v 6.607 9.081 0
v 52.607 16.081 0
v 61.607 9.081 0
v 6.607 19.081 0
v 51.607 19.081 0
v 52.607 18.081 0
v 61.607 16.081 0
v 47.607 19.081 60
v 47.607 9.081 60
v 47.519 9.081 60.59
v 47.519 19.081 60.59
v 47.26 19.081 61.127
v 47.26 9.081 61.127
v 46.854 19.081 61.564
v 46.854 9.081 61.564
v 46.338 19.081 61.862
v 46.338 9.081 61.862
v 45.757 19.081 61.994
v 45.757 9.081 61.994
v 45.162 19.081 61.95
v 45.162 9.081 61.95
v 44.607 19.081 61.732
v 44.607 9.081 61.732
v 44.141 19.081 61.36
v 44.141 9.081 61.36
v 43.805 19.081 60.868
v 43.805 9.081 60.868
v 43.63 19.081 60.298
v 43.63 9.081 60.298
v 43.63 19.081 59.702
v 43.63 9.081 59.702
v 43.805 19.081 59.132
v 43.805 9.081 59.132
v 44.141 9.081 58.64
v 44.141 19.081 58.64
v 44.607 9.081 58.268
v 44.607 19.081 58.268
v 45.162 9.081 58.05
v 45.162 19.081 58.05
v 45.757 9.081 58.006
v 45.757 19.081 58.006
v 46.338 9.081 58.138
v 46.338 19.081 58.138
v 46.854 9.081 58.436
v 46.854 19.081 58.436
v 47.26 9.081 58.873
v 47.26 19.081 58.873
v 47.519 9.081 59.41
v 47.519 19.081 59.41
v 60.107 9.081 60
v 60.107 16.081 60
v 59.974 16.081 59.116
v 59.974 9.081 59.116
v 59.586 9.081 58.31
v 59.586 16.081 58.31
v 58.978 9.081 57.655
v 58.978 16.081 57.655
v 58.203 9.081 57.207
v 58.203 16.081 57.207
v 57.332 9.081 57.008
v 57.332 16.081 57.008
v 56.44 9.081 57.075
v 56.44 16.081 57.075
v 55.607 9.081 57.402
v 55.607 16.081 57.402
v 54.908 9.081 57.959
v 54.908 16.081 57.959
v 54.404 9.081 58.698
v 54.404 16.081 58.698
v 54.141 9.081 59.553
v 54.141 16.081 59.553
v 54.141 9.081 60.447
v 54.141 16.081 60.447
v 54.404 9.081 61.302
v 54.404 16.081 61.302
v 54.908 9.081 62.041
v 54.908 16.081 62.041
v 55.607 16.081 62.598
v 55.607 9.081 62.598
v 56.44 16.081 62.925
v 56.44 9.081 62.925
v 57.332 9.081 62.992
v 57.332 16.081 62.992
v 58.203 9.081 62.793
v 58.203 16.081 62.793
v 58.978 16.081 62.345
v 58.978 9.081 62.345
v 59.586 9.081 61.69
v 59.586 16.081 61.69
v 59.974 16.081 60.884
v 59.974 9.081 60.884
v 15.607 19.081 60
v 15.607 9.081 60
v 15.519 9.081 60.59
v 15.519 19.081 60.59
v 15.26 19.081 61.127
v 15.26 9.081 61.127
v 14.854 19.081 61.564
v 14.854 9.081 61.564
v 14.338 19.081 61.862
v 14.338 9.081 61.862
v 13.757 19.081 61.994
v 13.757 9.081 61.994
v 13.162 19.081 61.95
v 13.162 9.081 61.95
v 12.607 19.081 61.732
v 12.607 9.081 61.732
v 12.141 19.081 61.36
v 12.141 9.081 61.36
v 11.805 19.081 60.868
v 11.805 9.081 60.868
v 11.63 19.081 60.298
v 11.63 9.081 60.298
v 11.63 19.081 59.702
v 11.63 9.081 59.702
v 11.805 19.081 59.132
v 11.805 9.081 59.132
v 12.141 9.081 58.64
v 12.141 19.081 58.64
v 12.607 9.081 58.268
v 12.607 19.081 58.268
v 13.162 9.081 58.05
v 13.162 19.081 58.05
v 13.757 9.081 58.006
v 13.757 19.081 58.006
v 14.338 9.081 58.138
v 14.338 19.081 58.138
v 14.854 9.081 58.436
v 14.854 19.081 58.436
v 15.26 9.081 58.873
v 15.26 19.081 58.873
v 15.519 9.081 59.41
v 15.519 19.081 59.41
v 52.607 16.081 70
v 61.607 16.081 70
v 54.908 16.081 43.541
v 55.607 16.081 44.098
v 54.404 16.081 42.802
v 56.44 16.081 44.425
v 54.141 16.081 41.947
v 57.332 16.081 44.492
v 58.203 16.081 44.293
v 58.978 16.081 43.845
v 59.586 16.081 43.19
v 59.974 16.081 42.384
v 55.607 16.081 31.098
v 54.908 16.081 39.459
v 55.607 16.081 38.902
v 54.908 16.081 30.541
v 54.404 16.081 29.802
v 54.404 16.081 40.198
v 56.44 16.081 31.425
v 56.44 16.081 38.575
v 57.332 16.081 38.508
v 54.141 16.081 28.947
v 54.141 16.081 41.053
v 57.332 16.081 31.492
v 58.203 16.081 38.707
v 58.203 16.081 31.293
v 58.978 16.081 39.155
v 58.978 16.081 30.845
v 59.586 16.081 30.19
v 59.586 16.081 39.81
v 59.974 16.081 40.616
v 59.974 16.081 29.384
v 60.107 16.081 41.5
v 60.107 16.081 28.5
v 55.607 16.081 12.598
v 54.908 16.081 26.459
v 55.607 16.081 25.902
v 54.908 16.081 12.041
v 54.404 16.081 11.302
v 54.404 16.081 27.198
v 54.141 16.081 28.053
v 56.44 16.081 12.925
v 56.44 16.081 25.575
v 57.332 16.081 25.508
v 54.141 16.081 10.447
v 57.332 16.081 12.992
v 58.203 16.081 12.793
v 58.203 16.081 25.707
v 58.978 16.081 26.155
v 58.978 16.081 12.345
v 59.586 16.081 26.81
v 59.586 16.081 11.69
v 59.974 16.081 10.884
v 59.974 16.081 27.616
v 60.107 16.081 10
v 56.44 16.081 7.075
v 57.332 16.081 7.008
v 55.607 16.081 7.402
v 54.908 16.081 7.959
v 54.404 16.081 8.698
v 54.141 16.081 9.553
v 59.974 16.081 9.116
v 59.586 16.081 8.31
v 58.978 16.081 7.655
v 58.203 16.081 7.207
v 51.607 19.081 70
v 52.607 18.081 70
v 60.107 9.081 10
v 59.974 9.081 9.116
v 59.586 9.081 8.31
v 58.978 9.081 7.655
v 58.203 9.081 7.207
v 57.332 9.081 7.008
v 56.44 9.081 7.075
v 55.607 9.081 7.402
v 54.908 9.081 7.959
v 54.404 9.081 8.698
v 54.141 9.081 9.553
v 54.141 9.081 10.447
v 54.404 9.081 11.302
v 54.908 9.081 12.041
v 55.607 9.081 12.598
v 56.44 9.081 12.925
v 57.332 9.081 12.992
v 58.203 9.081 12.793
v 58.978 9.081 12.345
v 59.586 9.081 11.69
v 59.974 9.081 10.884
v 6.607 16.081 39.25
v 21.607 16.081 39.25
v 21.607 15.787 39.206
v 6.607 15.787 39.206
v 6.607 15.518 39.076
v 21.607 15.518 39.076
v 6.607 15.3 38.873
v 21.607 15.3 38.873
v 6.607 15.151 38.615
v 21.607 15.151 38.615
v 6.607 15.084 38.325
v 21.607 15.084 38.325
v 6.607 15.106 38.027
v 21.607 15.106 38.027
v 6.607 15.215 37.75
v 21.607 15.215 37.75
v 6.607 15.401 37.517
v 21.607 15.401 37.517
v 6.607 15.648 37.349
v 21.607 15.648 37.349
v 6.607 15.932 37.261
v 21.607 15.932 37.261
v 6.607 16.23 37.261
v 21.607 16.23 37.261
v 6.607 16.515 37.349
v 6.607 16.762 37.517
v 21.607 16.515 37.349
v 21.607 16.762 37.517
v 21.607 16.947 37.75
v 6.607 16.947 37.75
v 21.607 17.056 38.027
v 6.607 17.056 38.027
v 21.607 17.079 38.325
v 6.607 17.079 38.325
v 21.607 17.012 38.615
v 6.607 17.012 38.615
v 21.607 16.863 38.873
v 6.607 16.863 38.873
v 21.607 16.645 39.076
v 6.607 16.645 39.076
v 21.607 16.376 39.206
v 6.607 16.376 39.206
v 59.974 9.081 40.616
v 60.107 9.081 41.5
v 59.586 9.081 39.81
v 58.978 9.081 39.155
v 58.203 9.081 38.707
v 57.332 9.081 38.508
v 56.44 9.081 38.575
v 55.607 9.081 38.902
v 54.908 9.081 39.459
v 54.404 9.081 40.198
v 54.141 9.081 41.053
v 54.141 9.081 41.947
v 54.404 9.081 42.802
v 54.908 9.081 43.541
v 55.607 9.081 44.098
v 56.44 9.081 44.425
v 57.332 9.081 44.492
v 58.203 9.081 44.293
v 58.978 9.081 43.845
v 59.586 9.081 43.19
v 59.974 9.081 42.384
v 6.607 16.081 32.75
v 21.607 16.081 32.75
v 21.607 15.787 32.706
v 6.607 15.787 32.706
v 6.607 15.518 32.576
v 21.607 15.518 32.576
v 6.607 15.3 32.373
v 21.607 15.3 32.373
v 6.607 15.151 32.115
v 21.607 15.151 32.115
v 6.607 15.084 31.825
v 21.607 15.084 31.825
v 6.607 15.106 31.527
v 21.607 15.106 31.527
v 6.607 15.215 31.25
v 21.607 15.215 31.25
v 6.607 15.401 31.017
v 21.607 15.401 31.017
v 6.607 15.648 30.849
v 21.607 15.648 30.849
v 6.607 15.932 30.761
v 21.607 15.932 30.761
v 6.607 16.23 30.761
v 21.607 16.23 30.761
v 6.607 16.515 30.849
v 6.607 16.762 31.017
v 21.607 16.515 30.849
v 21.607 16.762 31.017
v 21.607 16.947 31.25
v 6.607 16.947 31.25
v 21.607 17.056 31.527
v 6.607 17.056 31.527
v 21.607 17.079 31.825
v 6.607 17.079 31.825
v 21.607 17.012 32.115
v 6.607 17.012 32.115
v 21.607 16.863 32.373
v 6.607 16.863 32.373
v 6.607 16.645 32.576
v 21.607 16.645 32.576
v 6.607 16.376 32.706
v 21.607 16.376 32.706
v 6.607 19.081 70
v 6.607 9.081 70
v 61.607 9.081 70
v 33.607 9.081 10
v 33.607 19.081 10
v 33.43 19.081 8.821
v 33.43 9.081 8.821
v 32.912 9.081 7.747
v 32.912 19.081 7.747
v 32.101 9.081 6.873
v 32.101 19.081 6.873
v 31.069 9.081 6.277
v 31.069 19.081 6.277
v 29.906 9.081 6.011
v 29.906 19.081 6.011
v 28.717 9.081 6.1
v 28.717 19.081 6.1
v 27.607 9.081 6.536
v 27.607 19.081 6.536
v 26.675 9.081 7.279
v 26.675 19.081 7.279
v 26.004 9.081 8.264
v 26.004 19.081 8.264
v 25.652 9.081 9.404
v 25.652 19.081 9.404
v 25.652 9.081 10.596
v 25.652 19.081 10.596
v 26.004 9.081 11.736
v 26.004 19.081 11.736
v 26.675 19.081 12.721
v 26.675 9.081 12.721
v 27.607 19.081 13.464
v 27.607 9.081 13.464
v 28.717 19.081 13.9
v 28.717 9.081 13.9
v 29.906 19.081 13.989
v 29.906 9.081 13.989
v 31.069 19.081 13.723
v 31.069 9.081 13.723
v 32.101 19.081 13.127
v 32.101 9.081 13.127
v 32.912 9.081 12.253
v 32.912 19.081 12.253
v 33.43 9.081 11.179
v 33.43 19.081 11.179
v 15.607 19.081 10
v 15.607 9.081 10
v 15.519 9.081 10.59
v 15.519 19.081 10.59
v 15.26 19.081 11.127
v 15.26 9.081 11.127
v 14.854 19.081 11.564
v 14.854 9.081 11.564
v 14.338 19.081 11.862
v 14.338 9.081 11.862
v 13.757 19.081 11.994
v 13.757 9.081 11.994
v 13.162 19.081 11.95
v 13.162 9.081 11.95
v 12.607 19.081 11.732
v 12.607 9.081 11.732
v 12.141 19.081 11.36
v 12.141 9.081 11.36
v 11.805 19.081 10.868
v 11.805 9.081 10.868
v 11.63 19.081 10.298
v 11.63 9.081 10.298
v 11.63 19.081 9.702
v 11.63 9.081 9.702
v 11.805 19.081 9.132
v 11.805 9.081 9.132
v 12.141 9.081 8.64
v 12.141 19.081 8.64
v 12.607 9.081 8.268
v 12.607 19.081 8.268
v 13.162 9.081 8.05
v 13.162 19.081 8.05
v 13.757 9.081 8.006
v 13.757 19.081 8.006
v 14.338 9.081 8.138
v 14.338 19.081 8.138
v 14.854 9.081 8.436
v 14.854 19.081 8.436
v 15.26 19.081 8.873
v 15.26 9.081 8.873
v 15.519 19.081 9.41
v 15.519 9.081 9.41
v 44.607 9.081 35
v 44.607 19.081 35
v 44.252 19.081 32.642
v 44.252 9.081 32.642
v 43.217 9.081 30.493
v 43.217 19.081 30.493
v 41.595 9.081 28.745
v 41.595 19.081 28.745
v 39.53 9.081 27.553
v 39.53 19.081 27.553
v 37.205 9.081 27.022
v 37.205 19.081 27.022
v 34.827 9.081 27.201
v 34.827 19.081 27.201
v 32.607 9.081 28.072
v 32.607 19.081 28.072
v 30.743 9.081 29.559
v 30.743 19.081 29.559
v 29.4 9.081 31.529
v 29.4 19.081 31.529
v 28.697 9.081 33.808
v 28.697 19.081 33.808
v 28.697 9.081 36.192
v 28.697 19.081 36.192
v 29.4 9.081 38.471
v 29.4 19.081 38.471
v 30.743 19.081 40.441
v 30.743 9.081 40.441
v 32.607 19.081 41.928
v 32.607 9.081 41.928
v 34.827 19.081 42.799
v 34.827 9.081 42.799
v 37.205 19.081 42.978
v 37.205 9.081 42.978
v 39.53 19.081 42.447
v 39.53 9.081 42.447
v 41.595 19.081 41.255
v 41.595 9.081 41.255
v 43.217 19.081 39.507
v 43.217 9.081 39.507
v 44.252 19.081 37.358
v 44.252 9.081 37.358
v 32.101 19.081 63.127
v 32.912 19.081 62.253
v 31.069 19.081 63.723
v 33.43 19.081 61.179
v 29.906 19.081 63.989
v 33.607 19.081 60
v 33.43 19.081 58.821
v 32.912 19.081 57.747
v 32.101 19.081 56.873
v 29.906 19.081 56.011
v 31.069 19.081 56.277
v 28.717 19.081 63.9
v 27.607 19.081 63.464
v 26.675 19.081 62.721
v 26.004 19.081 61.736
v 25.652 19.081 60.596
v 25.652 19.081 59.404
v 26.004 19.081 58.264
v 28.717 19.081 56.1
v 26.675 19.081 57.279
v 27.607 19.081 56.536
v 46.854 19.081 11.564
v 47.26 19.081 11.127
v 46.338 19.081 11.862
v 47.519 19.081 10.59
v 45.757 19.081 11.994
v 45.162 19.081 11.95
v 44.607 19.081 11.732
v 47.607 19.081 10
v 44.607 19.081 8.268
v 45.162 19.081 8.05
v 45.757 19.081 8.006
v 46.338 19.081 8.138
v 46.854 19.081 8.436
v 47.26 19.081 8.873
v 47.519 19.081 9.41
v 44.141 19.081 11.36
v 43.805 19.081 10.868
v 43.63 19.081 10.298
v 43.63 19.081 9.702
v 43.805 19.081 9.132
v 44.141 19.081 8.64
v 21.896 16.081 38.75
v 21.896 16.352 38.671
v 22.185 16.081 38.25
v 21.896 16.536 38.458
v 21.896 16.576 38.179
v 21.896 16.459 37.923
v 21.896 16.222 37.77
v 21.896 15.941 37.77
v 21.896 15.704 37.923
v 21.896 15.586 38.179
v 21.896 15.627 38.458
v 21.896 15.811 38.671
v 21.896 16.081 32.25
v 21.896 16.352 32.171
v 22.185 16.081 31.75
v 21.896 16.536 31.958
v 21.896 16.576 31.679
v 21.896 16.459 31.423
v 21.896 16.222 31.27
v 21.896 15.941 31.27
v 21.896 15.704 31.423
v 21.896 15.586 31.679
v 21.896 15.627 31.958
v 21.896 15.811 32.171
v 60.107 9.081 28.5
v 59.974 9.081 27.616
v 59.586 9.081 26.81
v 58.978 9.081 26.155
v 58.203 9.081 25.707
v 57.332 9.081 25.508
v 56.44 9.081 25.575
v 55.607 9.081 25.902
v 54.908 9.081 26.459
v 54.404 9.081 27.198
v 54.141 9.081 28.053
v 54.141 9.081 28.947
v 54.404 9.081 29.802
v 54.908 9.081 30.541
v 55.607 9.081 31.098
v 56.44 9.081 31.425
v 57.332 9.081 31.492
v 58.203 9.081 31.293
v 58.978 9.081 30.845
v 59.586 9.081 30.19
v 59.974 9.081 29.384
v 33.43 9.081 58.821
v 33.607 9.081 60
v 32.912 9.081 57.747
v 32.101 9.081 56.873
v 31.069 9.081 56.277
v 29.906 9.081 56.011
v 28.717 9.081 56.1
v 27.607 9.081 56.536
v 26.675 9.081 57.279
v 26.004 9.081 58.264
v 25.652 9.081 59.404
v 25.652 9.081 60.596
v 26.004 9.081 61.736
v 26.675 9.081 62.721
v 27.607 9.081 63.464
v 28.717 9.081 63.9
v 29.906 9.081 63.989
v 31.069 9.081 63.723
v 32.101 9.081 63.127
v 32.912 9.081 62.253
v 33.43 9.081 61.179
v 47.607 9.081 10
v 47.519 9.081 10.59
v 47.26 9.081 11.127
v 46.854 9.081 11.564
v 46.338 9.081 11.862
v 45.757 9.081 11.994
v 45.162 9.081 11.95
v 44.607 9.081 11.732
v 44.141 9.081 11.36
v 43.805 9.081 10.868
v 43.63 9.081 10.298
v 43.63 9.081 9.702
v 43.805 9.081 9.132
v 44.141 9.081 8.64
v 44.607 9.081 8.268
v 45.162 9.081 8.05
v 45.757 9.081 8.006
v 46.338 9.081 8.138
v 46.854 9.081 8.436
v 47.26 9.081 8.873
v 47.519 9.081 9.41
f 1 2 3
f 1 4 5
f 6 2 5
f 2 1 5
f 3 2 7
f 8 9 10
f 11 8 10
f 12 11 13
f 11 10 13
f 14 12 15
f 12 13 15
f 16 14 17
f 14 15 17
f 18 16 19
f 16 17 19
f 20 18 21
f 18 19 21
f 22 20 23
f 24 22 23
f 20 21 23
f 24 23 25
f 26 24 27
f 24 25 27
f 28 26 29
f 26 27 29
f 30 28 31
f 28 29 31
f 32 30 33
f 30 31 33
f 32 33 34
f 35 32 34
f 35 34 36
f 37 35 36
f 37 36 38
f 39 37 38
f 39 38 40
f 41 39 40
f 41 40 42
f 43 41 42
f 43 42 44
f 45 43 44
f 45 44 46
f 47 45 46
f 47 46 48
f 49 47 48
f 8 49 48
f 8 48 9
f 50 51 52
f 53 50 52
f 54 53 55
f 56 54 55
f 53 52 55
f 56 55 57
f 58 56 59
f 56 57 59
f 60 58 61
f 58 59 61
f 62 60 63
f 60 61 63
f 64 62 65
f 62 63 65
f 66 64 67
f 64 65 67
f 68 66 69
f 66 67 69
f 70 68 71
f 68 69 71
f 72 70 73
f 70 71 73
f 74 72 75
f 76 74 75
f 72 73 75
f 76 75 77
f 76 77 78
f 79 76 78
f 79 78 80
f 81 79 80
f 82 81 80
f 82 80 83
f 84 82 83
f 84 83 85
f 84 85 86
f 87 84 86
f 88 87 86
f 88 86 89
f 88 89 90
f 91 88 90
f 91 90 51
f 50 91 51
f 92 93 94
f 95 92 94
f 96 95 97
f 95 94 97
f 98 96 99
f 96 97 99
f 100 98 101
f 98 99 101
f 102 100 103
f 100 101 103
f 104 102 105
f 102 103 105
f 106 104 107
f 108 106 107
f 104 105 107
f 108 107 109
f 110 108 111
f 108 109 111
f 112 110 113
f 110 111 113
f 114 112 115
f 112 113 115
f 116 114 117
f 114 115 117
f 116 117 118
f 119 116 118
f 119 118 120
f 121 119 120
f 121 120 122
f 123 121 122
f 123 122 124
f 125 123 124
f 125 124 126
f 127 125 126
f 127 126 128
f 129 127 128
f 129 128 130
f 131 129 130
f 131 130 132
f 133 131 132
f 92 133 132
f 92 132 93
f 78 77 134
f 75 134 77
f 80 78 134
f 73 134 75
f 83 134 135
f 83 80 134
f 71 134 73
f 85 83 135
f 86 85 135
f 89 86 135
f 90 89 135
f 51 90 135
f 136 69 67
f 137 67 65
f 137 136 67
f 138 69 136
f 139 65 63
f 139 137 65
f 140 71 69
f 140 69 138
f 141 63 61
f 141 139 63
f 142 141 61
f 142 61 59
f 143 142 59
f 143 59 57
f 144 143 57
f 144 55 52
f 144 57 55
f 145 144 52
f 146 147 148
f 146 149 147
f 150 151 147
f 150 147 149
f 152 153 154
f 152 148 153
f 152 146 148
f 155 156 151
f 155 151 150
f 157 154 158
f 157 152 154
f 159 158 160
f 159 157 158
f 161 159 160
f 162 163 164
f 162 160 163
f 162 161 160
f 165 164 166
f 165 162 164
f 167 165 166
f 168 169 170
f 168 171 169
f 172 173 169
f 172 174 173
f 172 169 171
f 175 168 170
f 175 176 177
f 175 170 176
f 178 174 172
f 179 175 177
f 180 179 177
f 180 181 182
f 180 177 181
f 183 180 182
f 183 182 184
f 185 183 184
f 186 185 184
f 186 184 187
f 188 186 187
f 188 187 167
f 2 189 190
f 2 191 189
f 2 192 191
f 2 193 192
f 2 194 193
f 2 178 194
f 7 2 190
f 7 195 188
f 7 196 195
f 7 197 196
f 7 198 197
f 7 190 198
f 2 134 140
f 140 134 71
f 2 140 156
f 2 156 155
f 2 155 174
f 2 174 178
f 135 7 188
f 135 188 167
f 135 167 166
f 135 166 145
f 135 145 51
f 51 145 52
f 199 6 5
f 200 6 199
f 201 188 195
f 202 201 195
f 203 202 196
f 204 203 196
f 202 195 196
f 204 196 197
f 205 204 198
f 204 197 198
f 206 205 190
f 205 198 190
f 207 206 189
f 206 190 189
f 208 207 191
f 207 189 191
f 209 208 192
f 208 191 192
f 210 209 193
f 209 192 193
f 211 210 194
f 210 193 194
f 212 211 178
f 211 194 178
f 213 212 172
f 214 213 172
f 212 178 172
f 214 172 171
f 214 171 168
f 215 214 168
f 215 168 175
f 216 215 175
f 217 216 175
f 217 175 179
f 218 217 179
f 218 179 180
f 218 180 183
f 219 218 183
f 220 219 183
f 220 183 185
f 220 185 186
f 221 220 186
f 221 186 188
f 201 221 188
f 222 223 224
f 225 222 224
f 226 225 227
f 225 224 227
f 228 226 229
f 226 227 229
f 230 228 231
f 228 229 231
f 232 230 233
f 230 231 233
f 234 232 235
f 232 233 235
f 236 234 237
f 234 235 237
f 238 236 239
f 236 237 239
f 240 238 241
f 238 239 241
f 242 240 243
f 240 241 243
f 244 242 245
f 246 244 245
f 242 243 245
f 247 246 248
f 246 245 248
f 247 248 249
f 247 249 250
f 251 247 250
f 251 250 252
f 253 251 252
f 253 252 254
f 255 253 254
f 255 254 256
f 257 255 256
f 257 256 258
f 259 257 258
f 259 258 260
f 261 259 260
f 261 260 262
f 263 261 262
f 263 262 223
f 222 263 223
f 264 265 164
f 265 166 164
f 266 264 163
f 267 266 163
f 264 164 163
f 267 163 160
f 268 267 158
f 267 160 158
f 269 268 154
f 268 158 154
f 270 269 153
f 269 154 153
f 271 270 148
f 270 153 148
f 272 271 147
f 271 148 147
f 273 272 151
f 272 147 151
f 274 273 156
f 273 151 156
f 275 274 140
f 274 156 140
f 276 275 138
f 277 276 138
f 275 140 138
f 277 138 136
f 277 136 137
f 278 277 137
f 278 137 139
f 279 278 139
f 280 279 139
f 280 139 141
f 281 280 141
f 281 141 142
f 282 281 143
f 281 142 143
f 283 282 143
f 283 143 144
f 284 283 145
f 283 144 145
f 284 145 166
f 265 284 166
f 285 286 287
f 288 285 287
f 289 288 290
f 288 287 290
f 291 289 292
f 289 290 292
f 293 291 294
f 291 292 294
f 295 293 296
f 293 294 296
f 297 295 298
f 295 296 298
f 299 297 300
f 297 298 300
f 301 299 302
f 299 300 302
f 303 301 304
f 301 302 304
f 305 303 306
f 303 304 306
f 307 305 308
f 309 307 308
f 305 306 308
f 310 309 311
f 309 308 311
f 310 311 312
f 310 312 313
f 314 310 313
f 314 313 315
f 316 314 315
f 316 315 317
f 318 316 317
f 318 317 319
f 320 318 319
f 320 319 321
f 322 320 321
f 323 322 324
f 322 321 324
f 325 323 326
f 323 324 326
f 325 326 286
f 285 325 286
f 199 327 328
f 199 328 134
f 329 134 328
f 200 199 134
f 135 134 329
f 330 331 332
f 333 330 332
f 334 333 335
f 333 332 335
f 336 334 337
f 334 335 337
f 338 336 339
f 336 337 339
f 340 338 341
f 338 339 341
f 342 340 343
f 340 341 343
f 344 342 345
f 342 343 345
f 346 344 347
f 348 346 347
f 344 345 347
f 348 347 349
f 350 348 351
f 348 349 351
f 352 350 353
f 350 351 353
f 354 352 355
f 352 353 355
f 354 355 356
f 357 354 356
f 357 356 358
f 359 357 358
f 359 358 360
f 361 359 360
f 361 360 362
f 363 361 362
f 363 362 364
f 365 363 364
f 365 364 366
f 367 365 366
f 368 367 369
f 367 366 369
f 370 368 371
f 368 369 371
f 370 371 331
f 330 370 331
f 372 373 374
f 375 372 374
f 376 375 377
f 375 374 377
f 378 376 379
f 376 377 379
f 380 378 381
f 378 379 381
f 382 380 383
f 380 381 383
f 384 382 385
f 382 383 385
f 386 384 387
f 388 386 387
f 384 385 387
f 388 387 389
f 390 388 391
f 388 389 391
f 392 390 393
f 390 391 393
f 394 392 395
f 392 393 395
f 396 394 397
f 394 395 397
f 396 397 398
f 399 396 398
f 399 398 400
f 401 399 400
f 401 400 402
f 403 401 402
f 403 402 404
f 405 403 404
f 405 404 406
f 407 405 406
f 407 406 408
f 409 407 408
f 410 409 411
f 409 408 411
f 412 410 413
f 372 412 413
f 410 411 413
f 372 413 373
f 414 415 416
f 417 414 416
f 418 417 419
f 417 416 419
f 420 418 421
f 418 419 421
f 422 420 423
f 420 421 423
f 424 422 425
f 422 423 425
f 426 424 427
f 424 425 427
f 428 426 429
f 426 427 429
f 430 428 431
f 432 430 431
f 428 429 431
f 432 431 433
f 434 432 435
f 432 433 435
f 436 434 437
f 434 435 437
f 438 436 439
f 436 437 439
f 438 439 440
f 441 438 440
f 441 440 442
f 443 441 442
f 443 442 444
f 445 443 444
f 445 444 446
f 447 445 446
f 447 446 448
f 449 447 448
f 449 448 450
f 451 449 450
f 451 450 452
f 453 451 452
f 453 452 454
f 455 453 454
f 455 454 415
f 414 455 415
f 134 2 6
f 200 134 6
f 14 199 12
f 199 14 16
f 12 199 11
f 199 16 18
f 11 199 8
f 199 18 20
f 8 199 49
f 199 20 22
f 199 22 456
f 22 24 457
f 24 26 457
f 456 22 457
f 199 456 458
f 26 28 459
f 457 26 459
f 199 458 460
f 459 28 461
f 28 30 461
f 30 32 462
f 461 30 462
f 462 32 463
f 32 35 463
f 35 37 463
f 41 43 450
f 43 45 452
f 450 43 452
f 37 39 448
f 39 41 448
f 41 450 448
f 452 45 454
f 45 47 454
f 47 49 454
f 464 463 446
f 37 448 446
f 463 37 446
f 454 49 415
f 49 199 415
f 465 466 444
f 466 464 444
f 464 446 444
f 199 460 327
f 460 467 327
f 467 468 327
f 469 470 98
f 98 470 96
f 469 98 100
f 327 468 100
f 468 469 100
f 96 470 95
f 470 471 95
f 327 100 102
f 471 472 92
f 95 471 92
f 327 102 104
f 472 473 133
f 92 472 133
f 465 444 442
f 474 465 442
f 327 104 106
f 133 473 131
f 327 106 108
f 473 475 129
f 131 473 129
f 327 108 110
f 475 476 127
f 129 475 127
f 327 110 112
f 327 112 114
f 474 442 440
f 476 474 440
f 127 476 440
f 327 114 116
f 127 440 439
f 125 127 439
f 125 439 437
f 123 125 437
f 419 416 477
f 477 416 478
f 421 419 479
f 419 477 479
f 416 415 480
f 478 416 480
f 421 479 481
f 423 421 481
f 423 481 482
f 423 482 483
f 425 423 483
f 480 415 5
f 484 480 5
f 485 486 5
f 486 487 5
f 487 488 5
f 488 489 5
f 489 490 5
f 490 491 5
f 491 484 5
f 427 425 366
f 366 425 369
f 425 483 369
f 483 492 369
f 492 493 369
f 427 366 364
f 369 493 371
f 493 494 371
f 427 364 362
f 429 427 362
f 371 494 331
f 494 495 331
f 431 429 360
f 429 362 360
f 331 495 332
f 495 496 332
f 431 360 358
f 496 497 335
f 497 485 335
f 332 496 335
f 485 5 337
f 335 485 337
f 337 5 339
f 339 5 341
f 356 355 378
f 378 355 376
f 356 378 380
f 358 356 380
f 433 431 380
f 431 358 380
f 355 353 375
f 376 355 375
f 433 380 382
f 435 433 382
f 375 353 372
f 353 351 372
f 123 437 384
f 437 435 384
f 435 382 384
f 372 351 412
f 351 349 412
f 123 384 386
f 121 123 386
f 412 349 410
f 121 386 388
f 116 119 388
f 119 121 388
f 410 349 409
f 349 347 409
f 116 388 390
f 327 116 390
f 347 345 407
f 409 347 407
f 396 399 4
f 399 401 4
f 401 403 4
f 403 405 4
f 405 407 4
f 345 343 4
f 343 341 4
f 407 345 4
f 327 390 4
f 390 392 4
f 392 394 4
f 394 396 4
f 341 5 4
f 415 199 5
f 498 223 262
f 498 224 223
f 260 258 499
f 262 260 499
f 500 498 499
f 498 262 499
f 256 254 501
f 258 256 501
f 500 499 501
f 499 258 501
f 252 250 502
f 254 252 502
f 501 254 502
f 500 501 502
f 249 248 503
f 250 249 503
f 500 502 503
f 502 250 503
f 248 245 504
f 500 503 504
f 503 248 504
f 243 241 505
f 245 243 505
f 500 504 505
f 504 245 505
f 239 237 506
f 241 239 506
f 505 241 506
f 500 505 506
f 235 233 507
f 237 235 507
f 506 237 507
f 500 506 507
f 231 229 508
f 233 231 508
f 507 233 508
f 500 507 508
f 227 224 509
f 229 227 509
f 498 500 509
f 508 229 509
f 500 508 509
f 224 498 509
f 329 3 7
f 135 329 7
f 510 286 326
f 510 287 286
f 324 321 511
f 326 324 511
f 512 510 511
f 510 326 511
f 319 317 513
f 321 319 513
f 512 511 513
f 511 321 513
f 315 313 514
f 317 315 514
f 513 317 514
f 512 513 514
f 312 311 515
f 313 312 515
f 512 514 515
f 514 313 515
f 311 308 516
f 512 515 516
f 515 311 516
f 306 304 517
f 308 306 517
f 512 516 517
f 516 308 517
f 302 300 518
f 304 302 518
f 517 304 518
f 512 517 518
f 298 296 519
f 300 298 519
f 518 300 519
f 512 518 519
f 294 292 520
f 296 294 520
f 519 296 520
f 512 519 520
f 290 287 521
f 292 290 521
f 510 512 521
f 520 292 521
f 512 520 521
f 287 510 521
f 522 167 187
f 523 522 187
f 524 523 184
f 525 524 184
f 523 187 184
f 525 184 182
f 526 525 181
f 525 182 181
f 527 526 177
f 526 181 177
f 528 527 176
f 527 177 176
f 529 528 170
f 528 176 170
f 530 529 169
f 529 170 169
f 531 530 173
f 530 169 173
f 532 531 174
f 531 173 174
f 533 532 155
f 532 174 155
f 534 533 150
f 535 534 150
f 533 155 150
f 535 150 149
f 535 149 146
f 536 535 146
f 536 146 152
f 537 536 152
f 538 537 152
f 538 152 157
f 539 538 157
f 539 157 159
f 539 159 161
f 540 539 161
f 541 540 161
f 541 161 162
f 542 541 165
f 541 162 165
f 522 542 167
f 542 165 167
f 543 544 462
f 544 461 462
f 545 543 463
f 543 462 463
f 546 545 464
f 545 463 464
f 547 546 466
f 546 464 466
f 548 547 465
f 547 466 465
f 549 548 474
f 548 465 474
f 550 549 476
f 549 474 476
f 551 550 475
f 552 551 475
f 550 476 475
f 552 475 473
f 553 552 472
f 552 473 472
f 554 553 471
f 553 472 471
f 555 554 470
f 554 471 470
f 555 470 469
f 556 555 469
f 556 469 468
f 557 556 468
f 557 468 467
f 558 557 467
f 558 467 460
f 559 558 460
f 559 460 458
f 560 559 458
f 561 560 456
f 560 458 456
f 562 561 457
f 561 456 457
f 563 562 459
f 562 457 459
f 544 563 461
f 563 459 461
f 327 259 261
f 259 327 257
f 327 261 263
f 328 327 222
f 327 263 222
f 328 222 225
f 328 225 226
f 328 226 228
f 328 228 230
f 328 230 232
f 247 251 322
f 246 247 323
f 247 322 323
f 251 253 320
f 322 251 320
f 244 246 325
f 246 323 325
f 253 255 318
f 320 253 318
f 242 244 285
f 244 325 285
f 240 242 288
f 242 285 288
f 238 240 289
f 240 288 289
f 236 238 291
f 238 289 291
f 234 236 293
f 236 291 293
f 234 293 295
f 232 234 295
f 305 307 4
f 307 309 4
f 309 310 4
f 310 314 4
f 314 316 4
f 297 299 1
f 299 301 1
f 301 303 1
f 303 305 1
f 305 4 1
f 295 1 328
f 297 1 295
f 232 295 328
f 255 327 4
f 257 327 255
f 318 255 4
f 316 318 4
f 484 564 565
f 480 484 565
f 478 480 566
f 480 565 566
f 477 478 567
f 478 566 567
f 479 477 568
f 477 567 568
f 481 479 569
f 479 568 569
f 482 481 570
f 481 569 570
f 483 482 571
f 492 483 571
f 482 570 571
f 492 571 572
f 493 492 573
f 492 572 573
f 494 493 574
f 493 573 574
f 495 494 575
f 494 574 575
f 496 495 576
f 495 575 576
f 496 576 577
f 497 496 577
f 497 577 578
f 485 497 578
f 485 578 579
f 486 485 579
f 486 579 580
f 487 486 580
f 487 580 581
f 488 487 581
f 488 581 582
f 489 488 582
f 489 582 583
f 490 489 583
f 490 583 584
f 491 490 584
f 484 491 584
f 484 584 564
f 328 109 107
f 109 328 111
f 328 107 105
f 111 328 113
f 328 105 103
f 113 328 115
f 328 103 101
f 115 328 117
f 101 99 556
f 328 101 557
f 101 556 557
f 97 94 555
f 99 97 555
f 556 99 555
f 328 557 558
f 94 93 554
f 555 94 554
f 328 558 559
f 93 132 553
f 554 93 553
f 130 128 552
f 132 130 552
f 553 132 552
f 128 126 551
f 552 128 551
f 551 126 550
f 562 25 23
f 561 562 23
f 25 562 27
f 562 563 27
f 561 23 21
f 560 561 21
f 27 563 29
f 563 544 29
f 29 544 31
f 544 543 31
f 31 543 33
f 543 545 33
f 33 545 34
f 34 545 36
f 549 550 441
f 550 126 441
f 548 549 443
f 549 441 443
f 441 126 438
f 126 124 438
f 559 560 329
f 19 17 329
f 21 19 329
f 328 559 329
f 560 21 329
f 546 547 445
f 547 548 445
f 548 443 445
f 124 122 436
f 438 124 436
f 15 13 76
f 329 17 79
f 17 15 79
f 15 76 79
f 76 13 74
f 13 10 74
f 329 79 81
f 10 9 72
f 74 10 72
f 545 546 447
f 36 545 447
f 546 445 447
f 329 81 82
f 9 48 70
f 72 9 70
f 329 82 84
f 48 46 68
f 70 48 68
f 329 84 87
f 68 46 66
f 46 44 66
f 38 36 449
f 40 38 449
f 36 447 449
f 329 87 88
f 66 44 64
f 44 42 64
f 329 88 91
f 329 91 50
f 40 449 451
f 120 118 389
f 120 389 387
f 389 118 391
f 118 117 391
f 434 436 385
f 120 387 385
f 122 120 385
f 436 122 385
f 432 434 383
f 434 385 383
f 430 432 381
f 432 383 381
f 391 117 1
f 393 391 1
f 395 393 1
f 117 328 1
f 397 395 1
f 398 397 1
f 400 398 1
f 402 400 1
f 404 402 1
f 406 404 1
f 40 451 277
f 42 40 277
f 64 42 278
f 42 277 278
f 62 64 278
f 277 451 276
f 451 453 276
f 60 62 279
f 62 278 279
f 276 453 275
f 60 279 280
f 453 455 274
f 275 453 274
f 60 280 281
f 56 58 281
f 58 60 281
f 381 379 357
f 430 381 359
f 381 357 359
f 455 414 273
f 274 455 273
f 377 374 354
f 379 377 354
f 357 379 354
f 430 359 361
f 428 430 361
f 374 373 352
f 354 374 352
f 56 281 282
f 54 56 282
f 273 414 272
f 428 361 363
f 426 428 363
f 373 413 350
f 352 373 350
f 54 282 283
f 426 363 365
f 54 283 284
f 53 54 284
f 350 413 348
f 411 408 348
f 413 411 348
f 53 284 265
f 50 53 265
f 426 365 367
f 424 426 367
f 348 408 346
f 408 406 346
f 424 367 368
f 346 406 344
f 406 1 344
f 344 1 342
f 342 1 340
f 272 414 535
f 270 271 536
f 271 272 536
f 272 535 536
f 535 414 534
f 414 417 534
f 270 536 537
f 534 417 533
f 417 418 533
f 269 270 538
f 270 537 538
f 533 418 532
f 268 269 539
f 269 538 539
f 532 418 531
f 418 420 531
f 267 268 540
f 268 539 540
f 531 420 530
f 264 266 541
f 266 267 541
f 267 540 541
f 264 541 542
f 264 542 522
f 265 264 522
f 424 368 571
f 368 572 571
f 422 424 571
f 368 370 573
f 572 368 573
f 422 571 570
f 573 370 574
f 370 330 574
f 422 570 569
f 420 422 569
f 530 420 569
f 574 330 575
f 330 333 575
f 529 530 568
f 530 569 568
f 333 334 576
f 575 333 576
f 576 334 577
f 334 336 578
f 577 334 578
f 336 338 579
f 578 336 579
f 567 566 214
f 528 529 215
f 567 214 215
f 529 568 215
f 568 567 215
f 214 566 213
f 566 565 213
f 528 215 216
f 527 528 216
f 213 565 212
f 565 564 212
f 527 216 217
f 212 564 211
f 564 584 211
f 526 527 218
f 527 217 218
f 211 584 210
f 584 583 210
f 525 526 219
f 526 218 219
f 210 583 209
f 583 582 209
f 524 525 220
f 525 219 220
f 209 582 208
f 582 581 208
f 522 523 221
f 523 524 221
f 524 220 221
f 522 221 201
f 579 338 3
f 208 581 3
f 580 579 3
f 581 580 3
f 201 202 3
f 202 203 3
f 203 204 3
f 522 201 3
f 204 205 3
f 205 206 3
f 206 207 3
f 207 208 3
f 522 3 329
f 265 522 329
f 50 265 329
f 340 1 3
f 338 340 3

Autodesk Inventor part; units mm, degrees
ref_plane "YZ Plane" through (0, 0, 0) normal (1, 0, 0) x (0, 1, 0)
ref_plane "XZ Plane" through (0, 0, 0) normal (0, 1, 0) x (-1, 0, 0)
ref_plane "XY Plane" through (0, 0, 0) normal (0, 0, 1) x (1, 0, 0)
sketch "Sketch1" plane through (0, 0, 0) normal (0, 0, 1) x (1, 0, 0)
  line L0 (6.6074, 9.0814) -> (61.6074, 9.0814)
  line L1 (61.6074, 9.0814) -> (61.6074, 16.0814)
  line L2 (52.6074, 19.0814) -> (6.6074, 19.0814)
  line L3 (6.6074, 19.0814) -> (6.6074, 9.0814)
  line L4 (52.6074, 16.0814) -> (52.6074, 19.0814)
  line L5 (52.6074, 16.0814) -> (61.6074, 16.0814)
  point P0 (0, 0)
  dimension "d0" = 55
  dimension "d1" = 7
  dimension "d6" = 9
  dimension "d7" = 3
extrude "Extrusion1" add sketch "Sketch1" along normal blind 70
sketch "Sketch2" plane through (6.6074, 19.0814, 0) normal (0, 1, 0) x (1, 0, 0)
  circle A0 centre (23, -10) radius 4
  circle A1 centre (23, -60) radius 4
  line L0 (46, -70) -> (0, -70) projected
  line L1 (55, 0) -> (55, -70) projected
  line L2 (46, 0) -> (0, 0) projected
  circle A2 centre (30, -35) radius 8
  line L3 (55, 0) -> (55, -70) projected
  circle A3 centre (50.5, -60) radius 3
  line L4 (46, 0) -> (46, -70) projected
  line L5 (55, -70) -> (46, -70) projected
  circle A4 centre (50.5, -41.5) radius 3
  circle A5 centre (50.5, -10) radius 3
  circle A6 centre (50.5, -28.5) radius 3
  line L6 (55, 0) -> (46, 0) projected
  line L7 (30, -43) -> (12.7252, -43)
  line L8 (23, -56) -> (14.0477, -56)
  line L9 (9, -14) -> (9, -56)
  line L10 (9, -56) -> (51, -56)
  line L11 (51, -56) -> (51, -14)
  line L12 (51, -14) -> (9, -14)
  circle A7 centre (14.5, -19.5) radius 2
  circle A8 centre (45.5, -19.5) radius 2
  circle A9 centre (45.5, -50.5) radius 2
  circle A10 centre (14.5, -51.5) radius 2
  line L13 (1, -101.1728) -> (51, -101.1728)
  circle A11 centre (39, -60) radius 2
  circle A12 centre (7, -60) radius 2
  circle A13 centre (30, -35) radius 12.5
  circle A14 centre (7, -60) radius 4
  circle A15 centre (39, -60) radius 4
  line L14 (0, 0) -> (0, -70) projected
  line L15 (0, -35) -> (-6.6074, -35)
  circle A16 centre (39, -10) radius 2
  circle A17 centre (7, -10) radius 2
  circle A18 centre (7, -10) radius 4
  circle A19 centre (39, -10) radius 4
  line L16 (37, -60) -> (37, -51.6268)
  line L17 (35, -60) -> (35, -52.1291)
  circle A20 centre (23, -60) radius 9
  line L18 (11, -60) -> (11, -66.8543)
  line L19 (14, -60) -> (14, -67.7509)
  line L20 (32, -60) -> (32, -67.7509)
  circle A21 centre (23, -60) radius 10
  line L21 (13, -60) -> (13, -90.2082)
  circle A22 centre (7, -97.0024) radius 2
  line L22 (13, -90.2082) -> (13, -105.086)
  circle A23 centre (39, -97.0024) radius 2
  line L23 (51, -101.1728) -> (51, -88.3214)
  line L24 (33, -60) -> (33, -163.1603)
  line L25 (1, -101.1728) -> (1, -81.8849)
  circle A24 centre (50.5, -105.086) radius 6.5
  line L26 (43, -90.2082) -> (43, -98.586)
  point P0 (-6.6074, 0)
  dimension "d11" = 8
  dimension "d17" = 16
  dimension "d55" = 4
  dimension "d64" = 8
  dimension "d65" = 8
  dimension "d10" = 8
  dimension "d12" = 10
  dimension "d15" = 10
  dimension "d18" = 35
  dimension "d22" = 6
  dimension "d23" = 4.5
  dimension "d24" = 10
  dimension "d30" = 10
  dimension "d33" = 32
  dimension "d34" = 32
  dimension "d35" = 25
  dimension "d36" = 4.5
  dimension "d37" = 4.5
  dimension "d40" = 42
  dimension "d41" = 42
  dimension "d42" = 42
  dimension "d43" = 4
  dimension "d44" = 4
  dimension "d45" = 4
  dimension "d46" = 4
  dimension "d47" = 31
  dimension "d48" = 31
  dimension "d50" = 32
  dimension "d51" = 5.5
  dimension "d52" = 5.5
  dimension "d53" = 5.5
  dimension "d54" = 50
  dimension "d56" = 4
  dimension "d59" = 60
  dimension "d60" = 60
  dimension "d61" = 21
  dimension "d62" = 5.5
  dimension "d63" = 25
  dimension "d69" = 7
  dimension "d71" = 18
  dimension "d72" = 14
  dimension "d73" = 14
  dimension "d74" = 20
  dimension "d75" = 4
  dimension "d76" = 4
  dimension "d79" = 6
  dimension "d80" = 6
  dimension "d83" = 12
  dimension "d84" = 13
  dimension "d86" = 8
  dimension "d129" = 28.5
  dimension "d130" = 28.5
extrude "Extrusion2" cut sketch "Sketch2" against normal blind 30 contours A0 | L11 A6 | A6 L11 | A1 | L11 A4 | A4 L11 | A2 | A3 | A5
sketch "Sketch4" plane through (6.6074, 9.0814, 0) normal (0, -1, 0) x (1, 0, 0)
  circle A0 centre (7, 60) radius 2
  circle A1 centre (39, 60) radius 2
  circle A2 centre (7, 10) radius 2
  circle A3 centre (39, 10) radius 2
  dimension "d97" = 4
  dimension "d98" = 4
  dimension "d99" = 4
extrude "Extrusion4" cut sketch "Sketch4" against normal blind 70
sketch "Boceto5" plane through (6.6074, 9.0814, 0) normal (-1, 0, 0) x (0, 0, 1)
  circle A0 centre (38.25, 7) radius 1
  circle A1 centre (31.75, 7) radius 1
  line L0 (70, 10) -> (70, 0) projected
  line L1 (0, 10) -> (70, 10) projected
  line L2 (35, 6.1177) -> (35, -0.846)
  point P0 (0, -9.0814)
  dimension "d106" = 2
  dimension "d139" = 3
  dimension "d140" = 2
  dimension "d141" = 3
  dimension "d142" = 6.5
  dimension "d143" = 3.25
  dimension "d144" = 35
hole "Agujero1" at (6.6074, 16.0814, 38.25) at (6.6074, 16.0814, 31.75) direction (1, 0, 0) diameter 2 depth 15 tip angle 120
thread "Thread3" size "M4x0.7" class "6H" standard "ISO Metric profile" length 98
thread "Thread4" size "M4x0.7" class "6H" standard "ISO Metric profile" length 98
thread "Thread5" size "M4x0.7" class "6H" standard "ISO Metric profile" length 98
thread "Thread6" size "M4x0.7" class "6H" standard "ISO Metric profile" length 98
thread "Thread7" size "M2x0.4" class "6H" standard "ISO Metric profile" length 12
thread "Thread8" size "M2x0.4" class "6H" standard "ISO Metric profile" length 12
chamfer "Chaflán1" distance 1 angle 45 1 edges at (52.6074, 19.0814, 35)
properties part number "Techo, Vínculo Cabezal" material "Aluminum 6061"
